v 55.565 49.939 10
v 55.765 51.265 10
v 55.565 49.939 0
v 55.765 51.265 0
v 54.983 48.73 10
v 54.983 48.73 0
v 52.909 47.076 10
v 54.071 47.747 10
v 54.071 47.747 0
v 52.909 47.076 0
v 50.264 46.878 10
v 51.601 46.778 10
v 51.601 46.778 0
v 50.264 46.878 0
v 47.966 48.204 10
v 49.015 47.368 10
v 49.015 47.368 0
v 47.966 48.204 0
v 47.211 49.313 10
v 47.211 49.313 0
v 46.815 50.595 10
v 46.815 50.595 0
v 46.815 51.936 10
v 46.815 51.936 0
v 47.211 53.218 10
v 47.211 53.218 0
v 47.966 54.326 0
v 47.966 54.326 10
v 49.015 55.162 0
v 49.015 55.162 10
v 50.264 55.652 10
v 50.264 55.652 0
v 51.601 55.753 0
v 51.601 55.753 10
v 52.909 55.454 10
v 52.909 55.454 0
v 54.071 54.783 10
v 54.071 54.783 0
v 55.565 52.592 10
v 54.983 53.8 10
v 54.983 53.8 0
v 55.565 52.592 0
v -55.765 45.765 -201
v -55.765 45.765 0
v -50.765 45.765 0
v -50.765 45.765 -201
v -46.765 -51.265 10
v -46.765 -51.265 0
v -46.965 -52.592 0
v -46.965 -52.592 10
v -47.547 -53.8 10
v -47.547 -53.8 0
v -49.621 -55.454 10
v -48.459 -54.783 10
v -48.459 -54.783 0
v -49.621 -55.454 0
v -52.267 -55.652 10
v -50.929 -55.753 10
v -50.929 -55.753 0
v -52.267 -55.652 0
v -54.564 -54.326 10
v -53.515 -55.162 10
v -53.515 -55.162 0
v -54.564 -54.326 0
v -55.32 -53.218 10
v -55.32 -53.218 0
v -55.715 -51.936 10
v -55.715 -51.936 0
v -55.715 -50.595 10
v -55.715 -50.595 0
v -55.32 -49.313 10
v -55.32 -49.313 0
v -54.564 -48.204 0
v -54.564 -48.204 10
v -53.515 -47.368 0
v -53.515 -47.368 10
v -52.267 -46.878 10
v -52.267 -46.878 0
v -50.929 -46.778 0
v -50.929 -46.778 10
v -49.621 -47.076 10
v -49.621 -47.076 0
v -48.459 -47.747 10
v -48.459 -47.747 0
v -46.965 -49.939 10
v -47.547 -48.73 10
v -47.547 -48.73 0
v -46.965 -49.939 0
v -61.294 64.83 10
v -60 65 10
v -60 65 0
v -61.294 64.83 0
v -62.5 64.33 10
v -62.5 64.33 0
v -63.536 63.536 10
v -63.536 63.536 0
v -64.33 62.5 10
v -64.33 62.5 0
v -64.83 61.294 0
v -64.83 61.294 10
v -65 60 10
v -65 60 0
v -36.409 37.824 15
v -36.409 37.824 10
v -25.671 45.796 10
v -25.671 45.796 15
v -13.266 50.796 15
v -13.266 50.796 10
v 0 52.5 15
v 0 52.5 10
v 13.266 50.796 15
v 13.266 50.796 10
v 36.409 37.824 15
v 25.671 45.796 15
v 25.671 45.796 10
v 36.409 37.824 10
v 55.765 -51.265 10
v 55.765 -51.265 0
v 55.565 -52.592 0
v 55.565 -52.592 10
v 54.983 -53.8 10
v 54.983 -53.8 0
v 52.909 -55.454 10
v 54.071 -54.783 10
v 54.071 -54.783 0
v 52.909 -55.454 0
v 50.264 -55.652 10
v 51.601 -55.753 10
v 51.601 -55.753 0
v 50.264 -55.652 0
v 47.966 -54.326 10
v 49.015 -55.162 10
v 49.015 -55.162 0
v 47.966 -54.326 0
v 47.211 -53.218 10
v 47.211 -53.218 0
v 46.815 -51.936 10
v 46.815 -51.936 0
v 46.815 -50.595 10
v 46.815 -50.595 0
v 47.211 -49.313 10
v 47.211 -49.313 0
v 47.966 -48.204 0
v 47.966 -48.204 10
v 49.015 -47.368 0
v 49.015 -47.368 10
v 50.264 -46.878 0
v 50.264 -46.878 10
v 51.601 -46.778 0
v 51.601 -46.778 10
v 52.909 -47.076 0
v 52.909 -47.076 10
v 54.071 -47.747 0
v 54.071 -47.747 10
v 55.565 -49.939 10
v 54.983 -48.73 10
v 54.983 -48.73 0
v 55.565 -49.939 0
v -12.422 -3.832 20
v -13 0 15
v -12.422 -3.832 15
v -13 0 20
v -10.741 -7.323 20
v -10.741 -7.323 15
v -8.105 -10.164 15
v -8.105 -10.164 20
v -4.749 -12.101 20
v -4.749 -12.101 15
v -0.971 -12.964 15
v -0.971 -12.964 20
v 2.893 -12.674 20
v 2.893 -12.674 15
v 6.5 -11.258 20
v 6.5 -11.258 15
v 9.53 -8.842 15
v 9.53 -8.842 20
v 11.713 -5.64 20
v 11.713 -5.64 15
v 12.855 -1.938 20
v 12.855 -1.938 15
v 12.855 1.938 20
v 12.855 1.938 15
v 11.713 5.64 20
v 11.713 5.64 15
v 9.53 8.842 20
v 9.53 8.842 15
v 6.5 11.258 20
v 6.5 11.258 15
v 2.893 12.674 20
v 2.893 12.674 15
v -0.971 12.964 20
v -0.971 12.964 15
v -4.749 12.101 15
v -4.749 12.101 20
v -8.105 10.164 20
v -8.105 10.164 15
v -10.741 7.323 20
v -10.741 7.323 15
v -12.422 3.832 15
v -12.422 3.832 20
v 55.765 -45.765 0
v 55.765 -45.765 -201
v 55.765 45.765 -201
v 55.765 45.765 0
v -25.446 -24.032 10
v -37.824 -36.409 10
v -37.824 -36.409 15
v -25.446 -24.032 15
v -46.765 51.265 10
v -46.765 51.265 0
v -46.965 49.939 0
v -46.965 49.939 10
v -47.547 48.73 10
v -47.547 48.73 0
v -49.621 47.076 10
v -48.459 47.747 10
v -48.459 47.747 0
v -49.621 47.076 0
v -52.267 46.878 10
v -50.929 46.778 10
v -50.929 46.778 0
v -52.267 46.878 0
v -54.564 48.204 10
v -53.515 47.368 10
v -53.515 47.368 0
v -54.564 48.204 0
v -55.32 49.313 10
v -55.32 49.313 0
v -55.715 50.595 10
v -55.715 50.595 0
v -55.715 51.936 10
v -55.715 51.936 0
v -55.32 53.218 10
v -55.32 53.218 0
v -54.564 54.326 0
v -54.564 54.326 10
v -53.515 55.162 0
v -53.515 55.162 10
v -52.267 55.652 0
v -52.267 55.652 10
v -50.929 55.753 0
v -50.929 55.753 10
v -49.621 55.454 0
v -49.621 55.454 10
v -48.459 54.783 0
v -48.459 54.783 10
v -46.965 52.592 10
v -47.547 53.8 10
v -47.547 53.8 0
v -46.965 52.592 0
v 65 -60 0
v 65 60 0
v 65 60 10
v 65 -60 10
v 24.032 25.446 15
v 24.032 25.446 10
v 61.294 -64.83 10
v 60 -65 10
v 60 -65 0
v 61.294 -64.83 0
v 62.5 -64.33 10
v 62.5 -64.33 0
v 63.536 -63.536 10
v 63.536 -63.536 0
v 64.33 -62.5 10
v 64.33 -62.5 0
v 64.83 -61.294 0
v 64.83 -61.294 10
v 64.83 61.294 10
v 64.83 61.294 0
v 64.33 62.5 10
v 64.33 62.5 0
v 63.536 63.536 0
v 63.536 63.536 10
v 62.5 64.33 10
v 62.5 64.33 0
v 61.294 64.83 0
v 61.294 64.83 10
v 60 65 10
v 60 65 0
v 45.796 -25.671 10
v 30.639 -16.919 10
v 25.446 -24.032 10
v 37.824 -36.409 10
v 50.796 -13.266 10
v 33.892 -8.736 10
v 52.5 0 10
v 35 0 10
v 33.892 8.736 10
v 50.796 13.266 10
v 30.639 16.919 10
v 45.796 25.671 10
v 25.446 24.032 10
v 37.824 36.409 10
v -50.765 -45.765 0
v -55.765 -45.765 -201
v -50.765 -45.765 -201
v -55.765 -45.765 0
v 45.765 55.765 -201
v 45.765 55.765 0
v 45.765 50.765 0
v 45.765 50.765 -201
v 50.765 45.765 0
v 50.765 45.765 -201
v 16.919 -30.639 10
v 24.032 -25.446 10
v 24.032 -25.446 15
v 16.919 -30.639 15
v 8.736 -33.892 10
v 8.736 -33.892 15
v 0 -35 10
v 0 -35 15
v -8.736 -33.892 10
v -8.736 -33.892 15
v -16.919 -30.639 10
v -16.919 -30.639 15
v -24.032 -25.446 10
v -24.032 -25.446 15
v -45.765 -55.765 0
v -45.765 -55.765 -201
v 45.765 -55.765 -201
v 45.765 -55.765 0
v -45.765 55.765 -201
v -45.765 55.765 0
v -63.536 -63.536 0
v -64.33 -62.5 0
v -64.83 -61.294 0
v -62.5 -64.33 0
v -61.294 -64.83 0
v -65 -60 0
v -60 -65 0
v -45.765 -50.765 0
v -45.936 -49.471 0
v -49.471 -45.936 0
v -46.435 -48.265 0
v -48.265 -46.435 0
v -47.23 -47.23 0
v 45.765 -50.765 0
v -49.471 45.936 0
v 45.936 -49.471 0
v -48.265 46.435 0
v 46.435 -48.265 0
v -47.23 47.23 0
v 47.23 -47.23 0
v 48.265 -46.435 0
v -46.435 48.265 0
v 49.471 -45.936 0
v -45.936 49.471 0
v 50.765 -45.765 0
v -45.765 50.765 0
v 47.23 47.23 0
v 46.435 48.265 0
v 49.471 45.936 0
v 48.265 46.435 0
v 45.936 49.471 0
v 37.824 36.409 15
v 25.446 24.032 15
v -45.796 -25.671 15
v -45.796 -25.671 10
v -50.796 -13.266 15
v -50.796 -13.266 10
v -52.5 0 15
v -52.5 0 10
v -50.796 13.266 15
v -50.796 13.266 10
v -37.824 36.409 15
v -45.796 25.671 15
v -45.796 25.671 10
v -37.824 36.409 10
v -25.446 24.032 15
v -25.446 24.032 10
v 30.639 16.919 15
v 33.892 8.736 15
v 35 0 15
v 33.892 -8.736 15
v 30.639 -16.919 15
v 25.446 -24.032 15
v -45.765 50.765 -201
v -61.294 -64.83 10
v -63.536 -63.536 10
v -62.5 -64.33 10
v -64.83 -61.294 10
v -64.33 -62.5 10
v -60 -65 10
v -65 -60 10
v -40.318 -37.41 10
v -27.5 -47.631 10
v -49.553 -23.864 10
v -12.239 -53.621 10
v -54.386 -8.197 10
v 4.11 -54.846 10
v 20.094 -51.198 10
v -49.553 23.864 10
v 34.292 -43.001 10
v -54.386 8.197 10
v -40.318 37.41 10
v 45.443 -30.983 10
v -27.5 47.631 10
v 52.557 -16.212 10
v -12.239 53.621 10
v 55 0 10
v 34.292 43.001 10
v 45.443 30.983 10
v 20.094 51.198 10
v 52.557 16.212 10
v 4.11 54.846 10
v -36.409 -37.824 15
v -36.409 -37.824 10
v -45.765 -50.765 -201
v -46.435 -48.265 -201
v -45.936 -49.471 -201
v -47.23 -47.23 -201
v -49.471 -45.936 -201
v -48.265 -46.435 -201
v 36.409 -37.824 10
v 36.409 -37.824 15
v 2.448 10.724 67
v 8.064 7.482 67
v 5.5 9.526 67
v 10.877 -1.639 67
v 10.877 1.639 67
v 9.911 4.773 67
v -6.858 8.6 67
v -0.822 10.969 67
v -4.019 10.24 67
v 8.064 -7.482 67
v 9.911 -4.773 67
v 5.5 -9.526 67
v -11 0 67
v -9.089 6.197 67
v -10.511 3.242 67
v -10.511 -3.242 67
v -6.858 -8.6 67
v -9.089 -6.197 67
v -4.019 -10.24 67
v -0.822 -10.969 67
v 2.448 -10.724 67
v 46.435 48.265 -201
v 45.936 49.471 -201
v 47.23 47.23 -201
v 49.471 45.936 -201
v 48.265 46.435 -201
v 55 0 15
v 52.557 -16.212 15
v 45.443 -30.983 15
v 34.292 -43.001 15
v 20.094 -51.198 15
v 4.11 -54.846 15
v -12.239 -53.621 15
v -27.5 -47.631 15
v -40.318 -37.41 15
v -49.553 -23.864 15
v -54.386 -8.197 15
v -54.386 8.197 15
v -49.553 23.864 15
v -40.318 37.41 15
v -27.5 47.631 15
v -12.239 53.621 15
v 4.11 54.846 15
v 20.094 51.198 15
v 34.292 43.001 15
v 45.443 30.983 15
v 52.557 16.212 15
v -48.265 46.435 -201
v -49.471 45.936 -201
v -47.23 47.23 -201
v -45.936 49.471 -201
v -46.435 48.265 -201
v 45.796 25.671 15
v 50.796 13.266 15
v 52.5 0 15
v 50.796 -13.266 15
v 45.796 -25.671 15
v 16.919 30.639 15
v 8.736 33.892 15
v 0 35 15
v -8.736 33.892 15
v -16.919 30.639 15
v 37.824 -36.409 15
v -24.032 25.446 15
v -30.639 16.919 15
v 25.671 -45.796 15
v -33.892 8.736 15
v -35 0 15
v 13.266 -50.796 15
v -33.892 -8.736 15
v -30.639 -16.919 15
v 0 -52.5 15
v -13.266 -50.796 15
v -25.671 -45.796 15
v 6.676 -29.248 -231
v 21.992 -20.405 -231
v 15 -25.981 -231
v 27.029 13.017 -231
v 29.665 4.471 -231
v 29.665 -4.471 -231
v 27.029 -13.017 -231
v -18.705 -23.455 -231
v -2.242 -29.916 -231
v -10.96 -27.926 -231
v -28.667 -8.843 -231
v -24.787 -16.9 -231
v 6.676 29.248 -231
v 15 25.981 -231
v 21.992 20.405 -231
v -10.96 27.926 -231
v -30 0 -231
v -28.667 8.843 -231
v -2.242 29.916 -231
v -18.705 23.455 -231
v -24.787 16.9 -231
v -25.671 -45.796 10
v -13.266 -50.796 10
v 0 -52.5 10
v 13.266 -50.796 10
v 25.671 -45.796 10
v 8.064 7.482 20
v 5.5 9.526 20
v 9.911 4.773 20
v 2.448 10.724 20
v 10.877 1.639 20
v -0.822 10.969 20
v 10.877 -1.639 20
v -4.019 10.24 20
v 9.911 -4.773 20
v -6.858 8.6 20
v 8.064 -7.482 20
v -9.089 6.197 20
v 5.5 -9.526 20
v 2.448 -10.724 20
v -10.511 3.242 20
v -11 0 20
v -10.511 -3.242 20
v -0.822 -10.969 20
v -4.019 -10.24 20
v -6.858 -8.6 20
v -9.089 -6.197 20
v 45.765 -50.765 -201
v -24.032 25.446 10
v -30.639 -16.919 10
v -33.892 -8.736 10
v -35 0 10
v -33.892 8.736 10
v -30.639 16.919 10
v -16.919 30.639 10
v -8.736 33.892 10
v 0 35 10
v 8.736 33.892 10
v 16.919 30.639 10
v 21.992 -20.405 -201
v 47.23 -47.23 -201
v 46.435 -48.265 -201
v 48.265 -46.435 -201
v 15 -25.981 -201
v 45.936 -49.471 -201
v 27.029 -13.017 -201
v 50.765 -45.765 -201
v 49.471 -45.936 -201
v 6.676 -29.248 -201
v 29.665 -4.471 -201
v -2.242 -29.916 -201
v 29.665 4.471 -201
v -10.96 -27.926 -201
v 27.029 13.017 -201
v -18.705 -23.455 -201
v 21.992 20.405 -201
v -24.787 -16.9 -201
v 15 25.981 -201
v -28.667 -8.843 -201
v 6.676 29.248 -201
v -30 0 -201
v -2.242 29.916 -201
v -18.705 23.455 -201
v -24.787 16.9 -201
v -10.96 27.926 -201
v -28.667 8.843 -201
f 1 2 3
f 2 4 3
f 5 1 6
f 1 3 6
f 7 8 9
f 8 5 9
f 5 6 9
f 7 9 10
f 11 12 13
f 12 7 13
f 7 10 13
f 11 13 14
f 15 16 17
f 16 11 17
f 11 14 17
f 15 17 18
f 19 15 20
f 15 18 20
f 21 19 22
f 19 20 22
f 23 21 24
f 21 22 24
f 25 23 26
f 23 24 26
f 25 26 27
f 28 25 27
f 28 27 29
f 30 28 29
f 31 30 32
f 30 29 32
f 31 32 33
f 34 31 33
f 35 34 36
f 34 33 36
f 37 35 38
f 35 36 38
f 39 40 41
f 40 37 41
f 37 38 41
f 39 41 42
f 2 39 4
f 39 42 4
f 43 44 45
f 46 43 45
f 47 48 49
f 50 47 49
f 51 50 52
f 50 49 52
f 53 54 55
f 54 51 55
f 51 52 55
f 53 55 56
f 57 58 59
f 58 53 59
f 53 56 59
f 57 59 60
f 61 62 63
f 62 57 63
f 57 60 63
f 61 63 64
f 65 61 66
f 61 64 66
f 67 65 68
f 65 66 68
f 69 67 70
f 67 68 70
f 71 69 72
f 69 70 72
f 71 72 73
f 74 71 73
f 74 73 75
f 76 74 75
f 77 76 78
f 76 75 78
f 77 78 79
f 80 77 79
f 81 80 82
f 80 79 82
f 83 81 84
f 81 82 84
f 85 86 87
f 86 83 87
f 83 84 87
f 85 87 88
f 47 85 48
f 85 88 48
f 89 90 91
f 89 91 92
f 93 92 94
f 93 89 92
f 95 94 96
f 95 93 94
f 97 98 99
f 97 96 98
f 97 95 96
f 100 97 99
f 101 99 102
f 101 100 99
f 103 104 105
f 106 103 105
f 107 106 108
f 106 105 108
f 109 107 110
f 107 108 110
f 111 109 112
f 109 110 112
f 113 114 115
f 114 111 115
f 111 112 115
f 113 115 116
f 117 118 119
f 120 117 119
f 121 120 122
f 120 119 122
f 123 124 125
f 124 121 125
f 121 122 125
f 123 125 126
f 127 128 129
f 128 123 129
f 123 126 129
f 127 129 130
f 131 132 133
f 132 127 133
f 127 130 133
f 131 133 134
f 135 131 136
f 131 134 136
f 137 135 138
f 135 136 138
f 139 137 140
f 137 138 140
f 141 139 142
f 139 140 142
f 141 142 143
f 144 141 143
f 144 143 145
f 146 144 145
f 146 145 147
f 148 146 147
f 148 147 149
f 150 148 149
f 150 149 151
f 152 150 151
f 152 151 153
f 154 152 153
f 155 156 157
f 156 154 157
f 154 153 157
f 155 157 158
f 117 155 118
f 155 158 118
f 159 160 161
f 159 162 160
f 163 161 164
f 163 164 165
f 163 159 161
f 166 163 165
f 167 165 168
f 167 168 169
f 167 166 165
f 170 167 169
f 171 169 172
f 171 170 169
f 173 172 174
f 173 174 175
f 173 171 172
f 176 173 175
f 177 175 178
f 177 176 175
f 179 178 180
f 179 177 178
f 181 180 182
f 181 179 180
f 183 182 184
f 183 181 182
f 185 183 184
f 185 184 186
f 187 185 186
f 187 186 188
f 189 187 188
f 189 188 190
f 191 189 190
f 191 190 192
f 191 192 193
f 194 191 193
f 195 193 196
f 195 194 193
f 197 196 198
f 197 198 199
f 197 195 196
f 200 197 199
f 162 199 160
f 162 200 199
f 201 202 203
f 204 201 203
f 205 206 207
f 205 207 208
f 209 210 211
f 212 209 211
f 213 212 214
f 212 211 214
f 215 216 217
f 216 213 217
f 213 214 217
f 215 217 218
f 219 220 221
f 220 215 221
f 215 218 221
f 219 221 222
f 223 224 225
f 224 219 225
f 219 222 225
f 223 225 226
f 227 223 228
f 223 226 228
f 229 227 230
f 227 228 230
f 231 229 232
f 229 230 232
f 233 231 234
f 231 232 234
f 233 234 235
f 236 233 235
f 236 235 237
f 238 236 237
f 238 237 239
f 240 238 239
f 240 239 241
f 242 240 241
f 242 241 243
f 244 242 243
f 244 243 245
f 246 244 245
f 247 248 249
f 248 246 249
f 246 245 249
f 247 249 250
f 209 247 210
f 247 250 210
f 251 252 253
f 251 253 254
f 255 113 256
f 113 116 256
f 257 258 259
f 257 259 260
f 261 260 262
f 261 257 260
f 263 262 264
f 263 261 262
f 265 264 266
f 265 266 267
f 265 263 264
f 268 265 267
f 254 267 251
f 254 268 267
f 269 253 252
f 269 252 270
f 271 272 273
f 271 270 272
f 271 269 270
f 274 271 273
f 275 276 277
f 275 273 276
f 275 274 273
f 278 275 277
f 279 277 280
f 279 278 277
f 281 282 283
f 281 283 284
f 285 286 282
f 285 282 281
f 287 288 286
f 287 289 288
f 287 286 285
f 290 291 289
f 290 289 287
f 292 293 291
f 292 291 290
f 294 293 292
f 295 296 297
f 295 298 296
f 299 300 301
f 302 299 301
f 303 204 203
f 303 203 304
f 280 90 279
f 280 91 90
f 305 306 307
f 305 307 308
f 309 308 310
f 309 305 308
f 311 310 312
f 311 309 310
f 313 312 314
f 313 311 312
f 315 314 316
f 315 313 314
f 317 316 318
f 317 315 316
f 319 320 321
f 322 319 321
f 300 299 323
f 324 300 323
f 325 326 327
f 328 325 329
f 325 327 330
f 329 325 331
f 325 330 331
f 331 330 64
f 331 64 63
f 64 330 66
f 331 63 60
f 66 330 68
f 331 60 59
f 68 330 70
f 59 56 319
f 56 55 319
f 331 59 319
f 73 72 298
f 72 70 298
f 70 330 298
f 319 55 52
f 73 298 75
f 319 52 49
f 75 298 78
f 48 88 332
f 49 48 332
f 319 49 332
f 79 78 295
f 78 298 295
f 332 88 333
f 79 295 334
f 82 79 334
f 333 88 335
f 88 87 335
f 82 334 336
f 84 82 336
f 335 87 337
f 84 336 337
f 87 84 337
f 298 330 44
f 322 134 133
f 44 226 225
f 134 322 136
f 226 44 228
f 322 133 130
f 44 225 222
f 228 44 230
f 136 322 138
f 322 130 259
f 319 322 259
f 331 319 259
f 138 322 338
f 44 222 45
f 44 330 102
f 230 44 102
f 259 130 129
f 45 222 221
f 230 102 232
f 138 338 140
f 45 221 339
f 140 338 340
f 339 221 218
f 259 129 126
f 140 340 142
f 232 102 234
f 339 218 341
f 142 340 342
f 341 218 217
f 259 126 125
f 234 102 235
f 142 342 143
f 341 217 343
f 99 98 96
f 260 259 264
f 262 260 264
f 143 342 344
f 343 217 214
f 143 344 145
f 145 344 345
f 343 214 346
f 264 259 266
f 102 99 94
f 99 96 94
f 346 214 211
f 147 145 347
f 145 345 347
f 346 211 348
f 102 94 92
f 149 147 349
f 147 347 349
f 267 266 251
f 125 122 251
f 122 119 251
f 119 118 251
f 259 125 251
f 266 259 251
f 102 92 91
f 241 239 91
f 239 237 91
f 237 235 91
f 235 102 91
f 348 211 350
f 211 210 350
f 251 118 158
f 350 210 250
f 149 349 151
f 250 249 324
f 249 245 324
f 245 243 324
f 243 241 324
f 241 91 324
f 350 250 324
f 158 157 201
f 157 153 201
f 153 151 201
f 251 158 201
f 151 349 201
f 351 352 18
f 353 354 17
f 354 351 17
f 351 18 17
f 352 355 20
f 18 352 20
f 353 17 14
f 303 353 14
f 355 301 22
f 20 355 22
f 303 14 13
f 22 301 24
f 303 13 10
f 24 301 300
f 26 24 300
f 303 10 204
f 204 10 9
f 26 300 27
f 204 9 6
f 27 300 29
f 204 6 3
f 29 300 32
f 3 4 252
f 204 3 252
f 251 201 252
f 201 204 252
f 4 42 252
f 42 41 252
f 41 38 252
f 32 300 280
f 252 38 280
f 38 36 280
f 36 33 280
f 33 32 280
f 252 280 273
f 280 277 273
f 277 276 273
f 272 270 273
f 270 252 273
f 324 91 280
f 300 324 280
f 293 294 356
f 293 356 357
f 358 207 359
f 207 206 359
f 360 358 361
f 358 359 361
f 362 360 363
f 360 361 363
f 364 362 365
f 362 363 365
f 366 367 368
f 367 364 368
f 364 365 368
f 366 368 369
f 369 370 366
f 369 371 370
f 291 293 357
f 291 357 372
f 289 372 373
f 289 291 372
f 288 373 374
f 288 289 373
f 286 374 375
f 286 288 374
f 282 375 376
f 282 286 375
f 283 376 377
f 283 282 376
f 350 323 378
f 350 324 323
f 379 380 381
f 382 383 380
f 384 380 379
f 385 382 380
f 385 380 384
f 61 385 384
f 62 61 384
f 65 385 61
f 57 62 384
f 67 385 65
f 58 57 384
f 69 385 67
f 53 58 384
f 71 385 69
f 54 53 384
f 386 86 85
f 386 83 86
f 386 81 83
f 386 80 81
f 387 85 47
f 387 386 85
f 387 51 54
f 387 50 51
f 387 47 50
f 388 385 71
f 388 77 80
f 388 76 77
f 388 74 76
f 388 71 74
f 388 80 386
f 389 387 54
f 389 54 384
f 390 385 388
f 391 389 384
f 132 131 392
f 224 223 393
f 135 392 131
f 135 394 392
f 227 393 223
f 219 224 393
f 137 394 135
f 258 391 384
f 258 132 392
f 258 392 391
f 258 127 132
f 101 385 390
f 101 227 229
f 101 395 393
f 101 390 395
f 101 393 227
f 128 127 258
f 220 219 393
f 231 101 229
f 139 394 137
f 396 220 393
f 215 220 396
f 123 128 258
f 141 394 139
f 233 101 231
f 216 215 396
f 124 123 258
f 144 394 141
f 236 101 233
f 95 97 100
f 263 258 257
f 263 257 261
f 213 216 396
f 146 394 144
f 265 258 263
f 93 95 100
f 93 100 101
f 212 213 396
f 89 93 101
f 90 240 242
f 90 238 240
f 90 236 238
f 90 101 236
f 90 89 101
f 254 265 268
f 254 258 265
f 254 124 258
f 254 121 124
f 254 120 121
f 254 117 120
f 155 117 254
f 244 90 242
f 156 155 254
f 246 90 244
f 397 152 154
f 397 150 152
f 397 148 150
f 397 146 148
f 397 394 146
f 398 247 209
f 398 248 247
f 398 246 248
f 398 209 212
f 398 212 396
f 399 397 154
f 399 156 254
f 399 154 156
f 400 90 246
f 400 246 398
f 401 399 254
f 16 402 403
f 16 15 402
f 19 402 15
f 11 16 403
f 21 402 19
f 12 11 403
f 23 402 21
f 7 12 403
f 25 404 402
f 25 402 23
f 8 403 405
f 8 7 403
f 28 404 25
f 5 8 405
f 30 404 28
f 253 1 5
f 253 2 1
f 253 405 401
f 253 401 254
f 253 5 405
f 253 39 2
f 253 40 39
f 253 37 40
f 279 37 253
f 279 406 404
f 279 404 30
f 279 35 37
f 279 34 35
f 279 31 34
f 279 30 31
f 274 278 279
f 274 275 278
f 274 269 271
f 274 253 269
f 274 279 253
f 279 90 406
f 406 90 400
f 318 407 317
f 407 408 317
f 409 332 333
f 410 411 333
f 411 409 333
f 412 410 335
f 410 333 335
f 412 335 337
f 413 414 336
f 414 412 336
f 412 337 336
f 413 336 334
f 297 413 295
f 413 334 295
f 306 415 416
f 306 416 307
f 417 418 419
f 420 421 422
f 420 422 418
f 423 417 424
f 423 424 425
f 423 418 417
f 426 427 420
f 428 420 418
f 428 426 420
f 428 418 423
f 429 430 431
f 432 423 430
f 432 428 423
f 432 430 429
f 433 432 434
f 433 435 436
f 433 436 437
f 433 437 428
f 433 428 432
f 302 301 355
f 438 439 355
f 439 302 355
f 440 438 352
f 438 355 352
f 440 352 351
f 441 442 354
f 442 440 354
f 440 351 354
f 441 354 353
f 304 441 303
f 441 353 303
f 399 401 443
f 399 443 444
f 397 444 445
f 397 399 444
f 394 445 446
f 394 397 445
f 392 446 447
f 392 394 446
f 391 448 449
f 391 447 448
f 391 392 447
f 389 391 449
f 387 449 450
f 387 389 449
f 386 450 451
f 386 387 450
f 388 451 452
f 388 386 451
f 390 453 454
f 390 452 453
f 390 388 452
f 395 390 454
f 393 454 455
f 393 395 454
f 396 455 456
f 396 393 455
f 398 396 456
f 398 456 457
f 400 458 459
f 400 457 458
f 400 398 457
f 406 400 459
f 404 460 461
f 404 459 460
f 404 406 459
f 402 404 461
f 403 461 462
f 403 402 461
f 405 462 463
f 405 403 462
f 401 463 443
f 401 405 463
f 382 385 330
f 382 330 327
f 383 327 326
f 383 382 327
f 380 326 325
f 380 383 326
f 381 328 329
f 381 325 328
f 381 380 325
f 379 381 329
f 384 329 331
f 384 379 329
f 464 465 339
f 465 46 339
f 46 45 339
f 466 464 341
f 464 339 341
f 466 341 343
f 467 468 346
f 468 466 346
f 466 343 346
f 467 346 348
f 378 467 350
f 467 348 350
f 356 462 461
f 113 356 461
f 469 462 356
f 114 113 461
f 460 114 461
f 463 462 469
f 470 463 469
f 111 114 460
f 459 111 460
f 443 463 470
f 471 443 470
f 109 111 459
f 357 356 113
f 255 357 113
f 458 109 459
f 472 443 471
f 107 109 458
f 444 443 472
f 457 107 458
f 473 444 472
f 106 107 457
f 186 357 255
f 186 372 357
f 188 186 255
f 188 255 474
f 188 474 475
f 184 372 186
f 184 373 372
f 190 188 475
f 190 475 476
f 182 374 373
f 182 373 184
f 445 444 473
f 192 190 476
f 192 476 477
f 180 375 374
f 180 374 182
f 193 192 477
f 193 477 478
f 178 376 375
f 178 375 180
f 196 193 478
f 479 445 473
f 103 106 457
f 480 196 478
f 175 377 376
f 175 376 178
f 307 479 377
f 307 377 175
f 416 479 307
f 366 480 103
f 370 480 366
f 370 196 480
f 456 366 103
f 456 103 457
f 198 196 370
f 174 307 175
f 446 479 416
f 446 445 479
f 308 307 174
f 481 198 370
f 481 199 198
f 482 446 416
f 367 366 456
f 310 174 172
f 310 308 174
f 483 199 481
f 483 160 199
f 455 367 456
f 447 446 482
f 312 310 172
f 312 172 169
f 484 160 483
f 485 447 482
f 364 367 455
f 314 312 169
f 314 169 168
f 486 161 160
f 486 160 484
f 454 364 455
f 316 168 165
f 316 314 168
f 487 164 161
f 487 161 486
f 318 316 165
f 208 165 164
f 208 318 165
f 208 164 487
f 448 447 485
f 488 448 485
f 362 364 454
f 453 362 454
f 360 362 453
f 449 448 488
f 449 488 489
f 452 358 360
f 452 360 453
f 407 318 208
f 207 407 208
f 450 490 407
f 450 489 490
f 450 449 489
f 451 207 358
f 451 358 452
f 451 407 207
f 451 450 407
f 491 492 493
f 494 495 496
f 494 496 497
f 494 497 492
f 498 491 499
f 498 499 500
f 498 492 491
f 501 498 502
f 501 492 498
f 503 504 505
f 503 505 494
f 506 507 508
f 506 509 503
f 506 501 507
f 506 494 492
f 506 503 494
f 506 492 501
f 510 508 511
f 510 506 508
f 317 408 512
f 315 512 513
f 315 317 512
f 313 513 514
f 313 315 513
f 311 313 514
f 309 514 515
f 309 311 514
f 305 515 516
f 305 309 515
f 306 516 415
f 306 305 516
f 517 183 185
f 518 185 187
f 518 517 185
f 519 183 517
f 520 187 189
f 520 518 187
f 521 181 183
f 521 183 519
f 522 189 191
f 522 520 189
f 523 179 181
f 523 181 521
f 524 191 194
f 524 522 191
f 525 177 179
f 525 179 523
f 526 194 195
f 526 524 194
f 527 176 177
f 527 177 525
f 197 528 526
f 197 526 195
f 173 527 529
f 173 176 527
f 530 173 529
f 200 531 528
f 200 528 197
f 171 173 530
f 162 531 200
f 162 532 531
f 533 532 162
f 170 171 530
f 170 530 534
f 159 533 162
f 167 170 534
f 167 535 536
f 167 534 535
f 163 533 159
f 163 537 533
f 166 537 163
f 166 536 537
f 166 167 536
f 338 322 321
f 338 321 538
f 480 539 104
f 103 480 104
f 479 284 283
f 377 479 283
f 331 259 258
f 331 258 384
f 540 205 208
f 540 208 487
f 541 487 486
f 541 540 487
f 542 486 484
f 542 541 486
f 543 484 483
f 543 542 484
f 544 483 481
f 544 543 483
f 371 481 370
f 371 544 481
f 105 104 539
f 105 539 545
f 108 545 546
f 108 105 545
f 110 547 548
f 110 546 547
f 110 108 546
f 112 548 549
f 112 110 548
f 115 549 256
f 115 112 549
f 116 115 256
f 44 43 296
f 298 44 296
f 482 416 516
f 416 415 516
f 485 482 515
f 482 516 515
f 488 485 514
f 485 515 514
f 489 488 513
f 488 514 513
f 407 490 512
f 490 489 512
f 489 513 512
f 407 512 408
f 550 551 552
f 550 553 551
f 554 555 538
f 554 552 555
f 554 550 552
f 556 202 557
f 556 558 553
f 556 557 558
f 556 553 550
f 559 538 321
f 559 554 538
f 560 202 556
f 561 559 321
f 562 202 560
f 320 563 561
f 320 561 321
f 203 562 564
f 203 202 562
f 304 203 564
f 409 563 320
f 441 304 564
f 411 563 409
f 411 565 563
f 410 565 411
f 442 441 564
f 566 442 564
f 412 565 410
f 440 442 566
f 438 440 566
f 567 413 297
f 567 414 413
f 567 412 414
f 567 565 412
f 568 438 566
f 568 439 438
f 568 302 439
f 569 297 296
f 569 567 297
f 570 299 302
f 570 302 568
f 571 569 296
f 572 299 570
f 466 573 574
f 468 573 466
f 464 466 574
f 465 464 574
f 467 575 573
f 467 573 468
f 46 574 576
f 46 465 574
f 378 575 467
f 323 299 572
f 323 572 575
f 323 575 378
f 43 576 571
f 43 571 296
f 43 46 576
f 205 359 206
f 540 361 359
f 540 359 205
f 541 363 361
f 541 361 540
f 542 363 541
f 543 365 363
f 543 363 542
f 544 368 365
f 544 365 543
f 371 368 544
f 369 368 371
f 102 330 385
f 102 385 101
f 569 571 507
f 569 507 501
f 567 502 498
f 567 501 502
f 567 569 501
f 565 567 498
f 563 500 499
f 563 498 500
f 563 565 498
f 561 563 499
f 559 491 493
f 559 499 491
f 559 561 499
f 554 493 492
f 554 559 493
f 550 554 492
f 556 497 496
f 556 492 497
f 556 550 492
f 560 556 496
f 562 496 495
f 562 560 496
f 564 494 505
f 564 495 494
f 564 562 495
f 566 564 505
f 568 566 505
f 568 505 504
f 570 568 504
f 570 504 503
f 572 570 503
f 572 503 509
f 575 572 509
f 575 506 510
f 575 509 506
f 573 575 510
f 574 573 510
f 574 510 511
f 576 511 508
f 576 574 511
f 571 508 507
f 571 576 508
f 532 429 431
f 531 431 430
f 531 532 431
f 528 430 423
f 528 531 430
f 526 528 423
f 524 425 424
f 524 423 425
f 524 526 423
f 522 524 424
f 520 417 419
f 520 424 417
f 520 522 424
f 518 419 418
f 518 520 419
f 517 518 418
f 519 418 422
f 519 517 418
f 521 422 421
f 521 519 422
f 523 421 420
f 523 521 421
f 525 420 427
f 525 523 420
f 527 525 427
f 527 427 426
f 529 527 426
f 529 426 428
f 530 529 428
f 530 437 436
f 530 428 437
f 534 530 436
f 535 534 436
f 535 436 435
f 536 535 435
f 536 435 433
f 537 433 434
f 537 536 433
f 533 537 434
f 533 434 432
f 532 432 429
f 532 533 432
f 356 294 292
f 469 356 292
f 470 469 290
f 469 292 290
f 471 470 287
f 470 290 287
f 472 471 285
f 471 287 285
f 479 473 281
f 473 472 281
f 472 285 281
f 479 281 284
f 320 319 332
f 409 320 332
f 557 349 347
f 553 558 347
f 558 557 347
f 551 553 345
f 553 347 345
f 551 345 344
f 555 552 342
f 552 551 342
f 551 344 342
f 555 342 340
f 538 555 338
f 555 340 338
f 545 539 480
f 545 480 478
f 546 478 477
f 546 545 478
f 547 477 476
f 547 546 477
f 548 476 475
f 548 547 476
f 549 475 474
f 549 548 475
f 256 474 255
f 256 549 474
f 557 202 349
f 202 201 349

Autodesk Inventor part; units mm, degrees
ref_plane "YZ Plane" through (0, 0, 0) normal (1, 0, 0) x (0, 1, 0)
ref_plane "XZ Plane" through (0, 0, 0) normal (0, 1, 0) x (-1, 0, 0)
ref_plane "XY Plane" through (0, 0, 0) normal (0, 0, 1) x (1, 0, 0)
sketch "Sketch1" plane through (0, 0, 0) normal (0, 0, 1) x (1, 0, 0)
  line L0 (65, -65) -> (-65, -65)
  line L1 (-65, -65) -> (-65, 65)
  line L2 (-65, 65) -> (65, 65)
  line L3 (65, 65) -> (65, -65)
  line L4 (65, -65) -> (-65, 65) construction
  line L5 (-65, -65) -> (65, 65) construction
  circle A0 centre (0, 0) radius 72.5 construction
  circle A1 centre (-51.2652, 51.2652) radius 4.5
  circle A2 centre (51.2652, 51.2652) radius 4.5
  line L6 (-65, 0) -> (65, 0) construction
  circle A3 centre (-51.2652, -51.2652) radius 4.5
  circle A4 centre (51.2652, -51.2652) radius 4.5
  dimension "d0" = 130
  dimension "d1" = 130
  dimension "d2" = 145
  dimension "d3" = 9
  dimension "d4" = 9
extrude "Extrusion1" add sketch "Sketch1" along normal blind 10
fillet "Fillet1" radius 5 4 edges at (-65, -65, 5) (65, -65, 5) (65, 65, 5) (-65, 65, 5)
sketch "Sketch2" plane through (0, 0, 10) normal (0, 0, 1) x (1, 0, 0)
  circle A0 centre (0, 0) radius 55
  circle A1 centre (0, 0) radius 54
  dimension "d8" = 110
extrude "Extrusion2" add sketch "Sketch2" along normal blind 5
sketch "Sketch3" plane through (0, 0, 10) normal (0, 0, 1) x (1, 0, 0)
  circle A0 centre (0, 0) radius 15
  line L0 (0, 0) -> (24.7487, -24.7487) construction
  line L1 (0, 0) -> (35, 0) construction
  line L2 (0, 0) -> (-24.7487, -24.7487) construction
  line L3 (0, 0) -> (35, 0) construction
  line L4 (0, 0) -> (24.7487, 24.7487) construction
  line L5 (0, 0) -> (-24.7487, 24.7487) construction
  line L6 (0.7071, 0.7071) -> (-24.0416, 25.4558) construction
  line L7 (37.8235, -36.4093) -> (25.4457, -24.0315)
  line L8 (36.4093, -37.8235) -> (24.0315, -25.4457)
  line L9 (-36.4093, -37.8235) -> (-24.0315, -25.4457)
  line L10 (-37.8235, -36.4093) -> (-25.4457, -24.0315)
  line L11 (-25.4457, 24.0315) -> (-37.8235, 36.4093)
  line L12 (-24.0315, 25.4457) -> (-36.4093, 37.8235)
  line L13 (-25.4457, 24.0315) -> (-25.4558, 24.0416)
  line L14 (-24.0315, 25.4457) -> (-24.0416, 25.4558)
  line L15 (-25.4457, 24.0315) -> (-25.4558, 24.0416)
  line L16 (36.4093, 37.8235) -> (24.0315, 25.4457)
  line L17 (37.8235, 36.4093) -> (25.4457, 24.0315)
  arc A1 (-24.0315, -25.4457) -> (24.0315, -25.4457) centre (0, 0) ccw
  arc A2 (-25.4457, 24.0315) -> (-25.4457, -24.0315) centre (0, 0) ccw
  arc A3 (25.4457, -24.0315) -> (25.4457, 24.0315) centre (0, 0) ccw
  arc A4 (24.0315, 25.4457) -> (-24.0315, 25.4457) centre (0, 0) ccw
  arc A5 (-36.4093, -37.8235) -> (36.4093, -37.8235) centre (0, 0) ccw
  arc A6 (-37.8235, 36.4093) -> (-37.8235, -36.4093) centre (0, 0) ccw
  arc A7 (37.8235, -36.4093) -> (37.8235, 36.4093) centre (0, 0) ccw
  arc A8 (36.4093, 37.8235) -> (-36.4093, 37.8235) centre (0, 0) ccw
  circle A9 centre (0, 0) radius 54 projected
  dimension "d12" = 30
  dimension "d14" = 45
  dimension "d15" = 135
extrude "Extrusion3" add sketch "Sketch3" along normal blind 5
sketch "Sketch4" plane through (0, 0, 0) normal (0, 1, 0) x (-1, 0, 0)
  line L0 (15, 15) -> (15, 10) projected
  line L1 (15, 10) -> (15, 15)
  line L2 (0, 15) -> (11, 15) construction
  line L3 (15, 15) -> (13, 15)
  line L4 (13, 15) -> (13, 20)
  line L5 (11, 16) -> (11, 67) construction
  line L6 (60, 10) -> (65, 10) construction
  line L7 (13, 20) -> (11, 20)
  line L8 (11, 67) -> (11, 20)
  line L9 (11, 67) -> (0, 67)
  line L10 (0, 67) -> (0, 10)
  line L11 (15, 10) -> (0, 10)
  line L12 (0, -13.4) -> (0, 80.4) projected
  point P0 (0, 0)
  dimension "d18" = 11
  dimension "d19" = 2
  dimension "d20" = 5
  dimension "d21" = 57
revolve "Revolution1" add sketch "Sketch4" angle 360 about axis through (0, 0, -10) along (0, 0, 1)
sketch "Sketch5" plane through (0, 0, 0) normal (0, 0, -1) x (-1, 0, 0)
  line L0 (-45.7652, 55.7652) -> (45.7652, 55.7652)
  line L1 (55.7652, 45.7652) -> (55.7652, -45.7652)
  line L2 (45.7652, -55.7652) -> (-45.7652, -55.7652)
  line L3 (-55.7652, -45.7652) -> (-55.7652, 45.7652)
  line L4 (-55.7652, 55.7652) -> (55.7652, -55.7652) construction
  line L5 (55.7652, 55.7652) -> (-55.7652, -55.7652) construction
  line L6 (55.7652, -55.7652) -> (55.7652, -45.7652) construction
  line L7 (55.7652, -45.7652) -> (50.7652, -45.7652)
  line L8 (45.7652, -55.7652) -> (45.7652, -50.7652)
  arc A0 (50.7652, -45.7652) -> (45.7652, -50.7652) centre (50.7652, -50.7652) ccw
  line L9 (0, 0) -> (0, -55.7652) construction
  line L10 (0, 0) -> (-55.7652, 0) construction
  line L11 (-55.7652, -45.7652) -> (-50.7652, -45.7652)
  line L12 (-45.7652, -55.7652) -> (-45.7652, -50.7652)
  arc A1 (-45.7652, -50.7652) -> (-50.7652, -45.7652) centre (-50.7652, -50.7652) ccw
  line L13 (55.7652, 45.7652) -> (50.7652, 45.7652)
  line L14 (45.7652, 55.7652) -> (45.7652, 50.7652)
  arc A2 (45.7652, 50.7652) -> (50.7652, 45.7652) centre (50.7652, 50.7652) ccw
  line L15 (-45.7652, 55.7652) -> (-45.7652, 50.7652)
  arc A3 (-50.7652, 45.7652) -> (-45.7652, 50.7652) centre (-50.7652, 50.7652) ccw
  line L16 (-55.7652, 45.7652) -> (-50.7652, 45.7652)
  point P0 (45.7652, -45.7652)
  dimension "d23" = 10
  dimension "d24" = 5
extrude "Extrusion4" add sketch "Sketch5" along normal blind 201
sketch "Sketch6" plane through (0, 0, -201) normal (0, 0, -1) x (-1, 0, 0)
  circle A0 centre (0, 0) radius 30
  dimension "d27" = 60
extrude "Extrusion5" add sketch "Sketch6" along normal blind 30
properties part number "SERVOMOTOR-2.3KWv1" material "Iron, Cast"
